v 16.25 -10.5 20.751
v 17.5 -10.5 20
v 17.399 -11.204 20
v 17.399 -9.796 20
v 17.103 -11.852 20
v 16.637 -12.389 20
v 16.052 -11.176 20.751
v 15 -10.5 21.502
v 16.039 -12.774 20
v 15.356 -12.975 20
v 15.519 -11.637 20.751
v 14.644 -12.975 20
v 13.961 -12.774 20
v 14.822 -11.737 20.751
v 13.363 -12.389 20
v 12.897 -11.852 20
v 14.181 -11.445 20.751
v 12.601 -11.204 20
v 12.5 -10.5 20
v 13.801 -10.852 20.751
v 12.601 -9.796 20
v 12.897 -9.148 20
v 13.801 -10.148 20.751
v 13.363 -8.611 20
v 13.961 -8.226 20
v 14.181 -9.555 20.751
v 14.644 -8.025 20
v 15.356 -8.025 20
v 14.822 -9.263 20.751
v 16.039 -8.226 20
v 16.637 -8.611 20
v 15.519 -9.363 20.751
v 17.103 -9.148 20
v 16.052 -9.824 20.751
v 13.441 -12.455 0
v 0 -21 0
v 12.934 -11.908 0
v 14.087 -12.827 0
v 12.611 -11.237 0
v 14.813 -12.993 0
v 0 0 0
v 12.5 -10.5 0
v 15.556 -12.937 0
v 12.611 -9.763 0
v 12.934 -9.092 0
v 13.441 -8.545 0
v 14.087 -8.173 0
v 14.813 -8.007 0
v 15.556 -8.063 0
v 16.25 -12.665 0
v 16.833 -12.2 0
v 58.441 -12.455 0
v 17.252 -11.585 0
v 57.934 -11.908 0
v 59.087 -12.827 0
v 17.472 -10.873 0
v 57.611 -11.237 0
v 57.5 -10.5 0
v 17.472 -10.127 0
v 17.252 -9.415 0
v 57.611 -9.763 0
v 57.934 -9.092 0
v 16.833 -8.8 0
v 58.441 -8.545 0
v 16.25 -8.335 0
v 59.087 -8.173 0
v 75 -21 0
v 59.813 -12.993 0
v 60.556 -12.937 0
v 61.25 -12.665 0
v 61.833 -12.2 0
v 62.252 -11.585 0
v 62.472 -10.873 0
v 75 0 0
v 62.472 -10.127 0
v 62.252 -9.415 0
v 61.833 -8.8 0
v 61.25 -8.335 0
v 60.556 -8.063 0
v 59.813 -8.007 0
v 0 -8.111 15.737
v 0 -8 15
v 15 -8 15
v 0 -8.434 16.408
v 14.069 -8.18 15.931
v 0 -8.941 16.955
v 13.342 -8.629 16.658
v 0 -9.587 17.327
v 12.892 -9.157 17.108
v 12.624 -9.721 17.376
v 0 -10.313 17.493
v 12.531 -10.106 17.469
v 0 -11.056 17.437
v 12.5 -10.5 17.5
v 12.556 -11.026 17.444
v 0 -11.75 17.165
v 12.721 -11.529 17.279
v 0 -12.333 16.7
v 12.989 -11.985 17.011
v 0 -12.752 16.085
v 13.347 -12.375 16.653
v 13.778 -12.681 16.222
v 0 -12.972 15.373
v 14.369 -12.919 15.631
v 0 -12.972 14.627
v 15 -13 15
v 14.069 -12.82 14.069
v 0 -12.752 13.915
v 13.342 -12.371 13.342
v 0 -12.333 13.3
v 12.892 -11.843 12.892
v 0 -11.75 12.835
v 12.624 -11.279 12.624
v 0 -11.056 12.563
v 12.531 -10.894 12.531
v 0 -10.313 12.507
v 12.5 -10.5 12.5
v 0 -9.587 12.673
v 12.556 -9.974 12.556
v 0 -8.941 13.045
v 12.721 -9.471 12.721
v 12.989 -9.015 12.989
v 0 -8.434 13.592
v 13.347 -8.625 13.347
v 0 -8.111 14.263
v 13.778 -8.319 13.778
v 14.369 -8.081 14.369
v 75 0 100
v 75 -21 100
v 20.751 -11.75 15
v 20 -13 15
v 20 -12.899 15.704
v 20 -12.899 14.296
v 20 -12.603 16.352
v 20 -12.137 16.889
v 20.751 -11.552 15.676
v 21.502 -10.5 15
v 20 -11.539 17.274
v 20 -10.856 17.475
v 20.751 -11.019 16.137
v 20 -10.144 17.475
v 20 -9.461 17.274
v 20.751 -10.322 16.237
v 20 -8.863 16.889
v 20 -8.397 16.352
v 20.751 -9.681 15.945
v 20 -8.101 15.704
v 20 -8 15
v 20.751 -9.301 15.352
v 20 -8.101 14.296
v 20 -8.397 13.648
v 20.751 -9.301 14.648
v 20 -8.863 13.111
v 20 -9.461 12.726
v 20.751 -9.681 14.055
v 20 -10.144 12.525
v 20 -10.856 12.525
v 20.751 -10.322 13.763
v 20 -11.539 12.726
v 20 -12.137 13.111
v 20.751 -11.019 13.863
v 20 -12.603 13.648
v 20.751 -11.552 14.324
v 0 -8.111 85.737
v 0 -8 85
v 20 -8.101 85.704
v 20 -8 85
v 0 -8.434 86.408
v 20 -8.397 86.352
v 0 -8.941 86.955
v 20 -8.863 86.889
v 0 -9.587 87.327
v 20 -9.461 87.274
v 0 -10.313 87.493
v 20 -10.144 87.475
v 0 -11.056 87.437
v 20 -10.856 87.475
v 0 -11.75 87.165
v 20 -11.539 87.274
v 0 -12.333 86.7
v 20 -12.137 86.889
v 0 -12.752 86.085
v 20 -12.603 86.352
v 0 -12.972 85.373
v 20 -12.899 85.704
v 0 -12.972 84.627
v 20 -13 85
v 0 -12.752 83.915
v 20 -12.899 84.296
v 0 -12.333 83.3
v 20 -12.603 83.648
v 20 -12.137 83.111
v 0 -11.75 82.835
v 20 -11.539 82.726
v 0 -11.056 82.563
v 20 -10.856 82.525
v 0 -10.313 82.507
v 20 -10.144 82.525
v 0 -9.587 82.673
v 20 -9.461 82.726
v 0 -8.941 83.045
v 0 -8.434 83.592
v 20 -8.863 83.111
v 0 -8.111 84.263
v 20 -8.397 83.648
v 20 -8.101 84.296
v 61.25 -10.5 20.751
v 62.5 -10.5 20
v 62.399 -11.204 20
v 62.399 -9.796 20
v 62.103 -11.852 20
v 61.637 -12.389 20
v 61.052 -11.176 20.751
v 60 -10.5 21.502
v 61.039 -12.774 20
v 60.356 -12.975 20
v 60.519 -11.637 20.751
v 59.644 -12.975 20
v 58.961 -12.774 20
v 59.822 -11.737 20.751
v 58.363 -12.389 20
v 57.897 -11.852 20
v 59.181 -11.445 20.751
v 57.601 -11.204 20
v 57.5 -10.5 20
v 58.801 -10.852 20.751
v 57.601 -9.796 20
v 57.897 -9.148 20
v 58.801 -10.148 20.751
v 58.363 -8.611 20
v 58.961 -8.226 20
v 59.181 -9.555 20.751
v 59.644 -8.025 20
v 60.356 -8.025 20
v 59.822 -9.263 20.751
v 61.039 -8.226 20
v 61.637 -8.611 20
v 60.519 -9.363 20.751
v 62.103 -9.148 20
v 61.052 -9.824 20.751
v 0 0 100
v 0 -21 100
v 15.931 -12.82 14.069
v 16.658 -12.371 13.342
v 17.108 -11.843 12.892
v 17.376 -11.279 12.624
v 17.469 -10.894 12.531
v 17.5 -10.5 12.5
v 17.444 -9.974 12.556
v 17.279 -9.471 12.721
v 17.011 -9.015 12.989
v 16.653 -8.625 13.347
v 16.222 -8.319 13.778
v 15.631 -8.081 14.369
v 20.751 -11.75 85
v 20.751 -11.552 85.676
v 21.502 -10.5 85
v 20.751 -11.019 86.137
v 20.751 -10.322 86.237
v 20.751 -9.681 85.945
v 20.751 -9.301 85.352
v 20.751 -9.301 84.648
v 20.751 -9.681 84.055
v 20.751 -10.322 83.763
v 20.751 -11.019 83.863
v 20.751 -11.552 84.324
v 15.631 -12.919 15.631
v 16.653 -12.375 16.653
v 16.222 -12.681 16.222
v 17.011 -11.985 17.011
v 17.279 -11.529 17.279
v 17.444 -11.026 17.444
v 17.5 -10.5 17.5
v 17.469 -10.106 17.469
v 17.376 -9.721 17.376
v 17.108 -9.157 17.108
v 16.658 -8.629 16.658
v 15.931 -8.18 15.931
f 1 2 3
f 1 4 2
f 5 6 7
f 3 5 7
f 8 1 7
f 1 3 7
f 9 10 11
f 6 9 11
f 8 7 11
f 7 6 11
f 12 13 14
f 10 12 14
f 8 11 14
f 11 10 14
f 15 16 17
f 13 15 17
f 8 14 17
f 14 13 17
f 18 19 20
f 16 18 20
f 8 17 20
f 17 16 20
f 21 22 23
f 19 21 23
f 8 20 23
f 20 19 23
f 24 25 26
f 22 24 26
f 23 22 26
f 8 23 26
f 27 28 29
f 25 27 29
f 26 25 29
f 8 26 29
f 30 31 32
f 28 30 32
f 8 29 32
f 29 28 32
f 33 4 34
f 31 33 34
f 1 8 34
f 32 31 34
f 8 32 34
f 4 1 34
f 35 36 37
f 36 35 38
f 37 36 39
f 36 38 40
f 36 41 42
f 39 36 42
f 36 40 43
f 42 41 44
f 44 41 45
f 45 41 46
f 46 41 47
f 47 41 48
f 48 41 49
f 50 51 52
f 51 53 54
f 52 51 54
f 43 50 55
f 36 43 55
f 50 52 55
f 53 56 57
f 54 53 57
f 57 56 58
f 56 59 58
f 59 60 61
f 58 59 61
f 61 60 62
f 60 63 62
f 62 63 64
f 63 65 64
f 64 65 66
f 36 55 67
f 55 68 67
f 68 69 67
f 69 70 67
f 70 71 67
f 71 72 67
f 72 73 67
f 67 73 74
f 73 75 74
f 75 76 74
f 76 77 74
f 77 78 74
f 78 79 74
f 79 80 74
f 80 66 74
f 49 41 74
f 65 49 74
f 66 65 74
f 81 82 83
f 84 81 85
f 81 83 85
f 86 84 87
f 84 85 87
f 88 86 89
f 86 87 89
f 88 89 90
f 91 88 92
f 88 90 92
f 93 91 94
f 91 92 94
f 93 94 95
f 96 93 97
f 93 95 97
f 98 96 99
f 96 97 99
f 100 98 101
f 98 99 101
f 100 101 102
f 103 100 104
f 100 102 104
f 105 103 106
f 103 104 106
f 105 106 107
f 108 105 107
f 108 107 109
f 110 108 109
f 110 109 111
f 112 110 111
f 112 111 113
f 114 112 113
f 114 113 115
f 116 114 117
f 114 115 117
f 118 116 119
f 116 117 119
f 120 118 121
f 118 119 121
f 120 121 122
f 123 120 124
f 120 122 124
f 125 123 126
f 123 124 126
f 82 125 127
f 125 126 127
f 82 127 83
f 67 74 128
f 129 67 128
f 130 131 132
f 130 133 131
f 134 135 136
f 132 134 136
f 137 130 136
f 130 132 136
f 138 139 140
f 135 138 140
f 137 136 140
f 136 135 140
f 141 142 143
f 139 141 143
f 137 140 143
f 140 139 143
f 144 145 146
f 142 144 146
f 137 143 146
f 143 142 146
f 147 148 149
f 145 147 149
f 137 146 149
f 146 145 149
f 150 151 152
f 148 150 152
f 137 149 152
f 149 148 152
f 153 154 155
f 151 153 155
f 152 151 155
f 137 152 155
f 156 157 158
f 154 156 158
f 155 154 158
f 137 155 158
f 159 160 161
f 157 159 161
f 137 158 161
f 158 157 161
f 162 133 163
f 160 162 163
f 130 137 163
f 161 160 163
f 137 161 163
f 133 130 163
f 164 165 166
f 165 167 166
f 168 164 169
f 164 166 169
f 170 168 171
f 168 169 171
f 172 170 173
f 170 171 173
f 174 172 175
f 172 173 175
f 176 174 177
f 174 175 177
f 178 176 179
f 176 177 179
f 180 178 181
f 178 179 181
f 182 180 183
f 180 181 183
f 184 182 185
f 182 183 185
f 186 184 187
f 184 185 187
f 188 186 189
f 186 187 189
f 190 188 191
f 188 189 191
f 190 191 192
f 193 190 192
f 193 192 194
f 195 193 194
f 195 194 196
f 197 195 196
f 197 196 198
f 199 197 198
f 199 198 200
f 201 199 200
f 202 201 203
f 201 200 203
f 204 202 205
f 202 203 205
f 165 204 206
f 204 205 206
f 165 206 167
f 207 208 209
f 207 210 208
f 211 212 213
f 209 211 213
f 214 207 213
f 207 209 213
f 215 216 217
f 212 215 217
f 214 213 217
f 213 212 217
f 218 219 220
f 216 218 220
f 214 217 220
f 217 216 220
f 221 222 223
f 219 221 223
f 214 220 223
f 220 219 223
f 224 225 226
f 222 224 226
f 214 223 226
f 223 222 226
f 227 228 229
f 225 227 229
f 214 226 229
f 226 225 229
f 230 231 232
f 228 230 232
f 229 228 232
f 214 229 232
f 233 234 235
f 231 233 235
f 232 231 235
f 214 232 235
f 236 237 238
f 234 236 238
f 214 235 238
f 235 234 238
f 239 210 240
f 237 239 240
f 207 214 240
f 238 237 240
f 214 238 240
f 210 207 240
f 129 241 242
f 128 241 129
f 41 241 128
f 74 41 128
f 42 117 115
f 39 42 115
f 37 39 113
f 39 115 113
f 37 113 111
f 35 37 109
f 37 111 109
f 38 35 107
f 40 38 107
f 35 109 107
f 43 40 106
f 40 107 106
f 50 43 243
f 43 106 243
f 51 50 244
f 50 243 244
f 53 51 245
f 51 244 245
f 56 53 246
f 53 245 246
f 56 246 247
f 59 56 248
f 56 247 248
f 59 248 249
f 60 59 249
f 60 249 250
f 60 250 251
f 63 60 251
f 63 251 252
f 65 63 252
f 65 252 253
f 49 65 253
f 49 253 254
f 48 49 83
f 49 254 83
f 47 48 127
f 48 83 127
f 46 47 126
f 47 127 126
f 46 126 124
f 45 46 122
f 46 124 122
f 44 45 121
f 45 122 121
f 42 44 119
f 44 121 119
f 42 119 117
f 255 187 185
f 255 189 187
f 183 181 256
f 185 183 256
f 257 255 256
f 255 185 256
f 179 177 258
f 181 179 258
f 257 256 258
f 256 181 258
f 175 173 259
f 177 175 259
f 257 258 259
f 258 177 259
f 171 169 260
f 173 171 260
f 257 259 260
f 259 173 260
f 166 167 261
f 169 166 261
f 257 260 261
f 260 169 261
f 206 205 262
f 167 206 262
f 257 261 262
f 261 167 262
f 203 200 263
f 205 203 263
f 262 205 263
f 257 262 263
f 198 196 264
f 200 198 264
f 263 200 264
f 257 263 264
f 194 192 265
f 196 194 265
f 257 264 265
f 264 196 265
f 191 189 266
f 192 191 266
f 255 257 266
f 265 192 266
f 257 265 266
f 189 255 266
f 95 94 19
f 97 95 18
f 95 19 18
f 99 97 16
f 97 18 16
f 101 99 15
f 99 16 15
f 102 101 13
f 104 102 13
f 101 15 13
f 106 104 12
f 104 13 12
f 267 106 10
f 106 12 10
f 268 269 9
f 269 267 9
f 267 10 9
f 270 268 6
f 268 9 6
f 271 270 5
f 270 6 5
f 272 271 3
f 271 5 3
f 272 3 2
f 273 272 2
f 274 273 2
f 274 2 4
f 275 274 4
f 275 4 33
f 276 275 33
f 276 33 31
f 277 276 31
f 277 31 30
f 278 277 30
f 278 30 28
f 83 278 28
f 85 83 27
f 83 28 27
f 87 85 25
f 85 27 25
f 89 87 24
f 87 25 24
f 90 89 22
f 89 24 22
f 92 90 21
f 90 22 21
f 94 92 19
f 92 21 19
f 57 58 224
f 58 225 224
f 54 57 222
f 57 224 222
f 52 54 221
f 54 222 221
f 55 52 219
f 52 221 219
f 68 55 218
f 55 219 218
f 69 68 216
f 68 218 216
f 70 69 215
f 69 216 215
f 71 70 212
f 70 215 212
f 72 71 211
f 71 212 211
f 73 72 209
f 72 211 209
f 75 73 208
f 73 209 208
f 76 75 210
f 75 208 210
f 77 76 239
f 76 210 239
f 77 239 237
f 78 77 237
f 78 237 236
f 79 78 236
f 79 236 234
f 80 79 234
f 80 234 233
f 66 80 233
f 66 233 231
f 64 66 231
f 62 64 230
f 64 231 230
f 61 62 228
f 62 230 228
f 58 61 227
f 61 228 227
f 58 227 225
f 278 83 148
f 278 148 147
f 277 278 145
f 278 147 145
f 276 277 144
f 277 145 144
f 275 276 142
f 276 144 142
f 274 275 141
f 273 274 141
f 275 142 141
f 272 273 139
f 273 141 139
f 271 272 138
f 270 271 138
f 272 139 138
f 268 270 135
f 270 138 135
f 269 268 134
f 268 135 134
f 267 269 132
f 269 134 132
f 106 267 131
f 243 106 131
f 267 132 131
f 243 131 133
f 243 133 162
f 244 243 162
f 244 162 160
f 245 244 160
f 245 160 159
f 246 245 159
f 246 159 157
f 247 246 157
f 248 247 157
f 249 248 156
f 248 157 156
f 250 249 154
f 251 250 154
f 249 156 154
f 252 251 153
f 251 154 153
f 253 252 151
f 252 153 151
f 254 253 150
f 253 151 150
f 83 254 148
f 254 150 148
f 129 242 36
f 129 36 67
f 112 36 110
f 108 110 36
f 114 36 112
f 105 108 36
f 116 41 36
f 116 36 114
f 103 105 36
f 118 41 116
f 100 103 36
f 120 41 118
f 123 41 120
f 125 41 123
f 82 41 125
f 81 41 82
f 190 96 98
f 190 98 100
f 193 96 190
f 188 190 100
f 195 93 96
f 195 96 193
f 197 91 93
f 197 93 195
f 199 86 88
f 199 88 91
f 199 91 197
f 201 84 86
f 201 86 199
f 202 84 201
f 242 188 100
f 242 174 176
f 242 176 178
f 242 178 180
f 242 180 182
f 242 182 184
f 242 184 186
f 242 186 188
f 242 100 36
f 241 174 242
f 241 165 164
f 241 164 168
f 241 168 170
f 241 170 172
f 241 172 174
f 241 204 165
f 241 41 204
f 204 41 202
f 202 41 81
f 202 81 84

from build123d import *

# Parameters (mm, degrees)
F0_W           = 75
F0_H           = 100
F1_DEPTH       = 21
F4_D           = 5
F4_DEPTH       = 20
F4_TIP         = 1.5021515476
F4_ON_F3_D     = 5
F4_ON_F3_DEPTH = 20
F4_ON_F3_TIP   = 1.5021515476


with BuildPart() as f1:
    # F0 (on Front) → F1 (new body)
    with BuildSketch(Plane.XZ):
        with Locations((37.5, 50)):
            Rectangle(F0_W, F0_H)
    extrude(amount=F1_DEPTH)

    # F4
    with Locations(Plane(origin=(0, 0, 0), x_dir=(0, -1, 0), z_dir=(-1, 0, 0))):
        with Locations((10.5, 15), (10.5, 85)):
            Hole(F4_D / 2, depth=F4_DEPTH)
            with Locations((0, 0, -(F4_DEPTH + F4_TIP / 2))):  # 118° drill point
                Cone(0, F4_D / 2, F4_TIP, mode=Mode.SUBTRACT)

    # F4 on F3
    with Locations(Plane(origin=(0, 0, 0), x_dir=(1, 0, 0), z_dir=(0, 0, -1))):
        with Locations((15, 10.5), (60, 10.5)):
            Hole(F4_ON_F3_D / 2, depth=F4_ON_F3_DEPTH)
            with Locations((0, 0, -(F4_ON_F3_DEPTH + F4_ON_F3_TIP / 2))):  # 118° drill point
                Cone(0, F4_ON_F3_D / 2, F4_ON_F3_TIP, mode=Mode.SUBTRACT)


solid = f1.part
